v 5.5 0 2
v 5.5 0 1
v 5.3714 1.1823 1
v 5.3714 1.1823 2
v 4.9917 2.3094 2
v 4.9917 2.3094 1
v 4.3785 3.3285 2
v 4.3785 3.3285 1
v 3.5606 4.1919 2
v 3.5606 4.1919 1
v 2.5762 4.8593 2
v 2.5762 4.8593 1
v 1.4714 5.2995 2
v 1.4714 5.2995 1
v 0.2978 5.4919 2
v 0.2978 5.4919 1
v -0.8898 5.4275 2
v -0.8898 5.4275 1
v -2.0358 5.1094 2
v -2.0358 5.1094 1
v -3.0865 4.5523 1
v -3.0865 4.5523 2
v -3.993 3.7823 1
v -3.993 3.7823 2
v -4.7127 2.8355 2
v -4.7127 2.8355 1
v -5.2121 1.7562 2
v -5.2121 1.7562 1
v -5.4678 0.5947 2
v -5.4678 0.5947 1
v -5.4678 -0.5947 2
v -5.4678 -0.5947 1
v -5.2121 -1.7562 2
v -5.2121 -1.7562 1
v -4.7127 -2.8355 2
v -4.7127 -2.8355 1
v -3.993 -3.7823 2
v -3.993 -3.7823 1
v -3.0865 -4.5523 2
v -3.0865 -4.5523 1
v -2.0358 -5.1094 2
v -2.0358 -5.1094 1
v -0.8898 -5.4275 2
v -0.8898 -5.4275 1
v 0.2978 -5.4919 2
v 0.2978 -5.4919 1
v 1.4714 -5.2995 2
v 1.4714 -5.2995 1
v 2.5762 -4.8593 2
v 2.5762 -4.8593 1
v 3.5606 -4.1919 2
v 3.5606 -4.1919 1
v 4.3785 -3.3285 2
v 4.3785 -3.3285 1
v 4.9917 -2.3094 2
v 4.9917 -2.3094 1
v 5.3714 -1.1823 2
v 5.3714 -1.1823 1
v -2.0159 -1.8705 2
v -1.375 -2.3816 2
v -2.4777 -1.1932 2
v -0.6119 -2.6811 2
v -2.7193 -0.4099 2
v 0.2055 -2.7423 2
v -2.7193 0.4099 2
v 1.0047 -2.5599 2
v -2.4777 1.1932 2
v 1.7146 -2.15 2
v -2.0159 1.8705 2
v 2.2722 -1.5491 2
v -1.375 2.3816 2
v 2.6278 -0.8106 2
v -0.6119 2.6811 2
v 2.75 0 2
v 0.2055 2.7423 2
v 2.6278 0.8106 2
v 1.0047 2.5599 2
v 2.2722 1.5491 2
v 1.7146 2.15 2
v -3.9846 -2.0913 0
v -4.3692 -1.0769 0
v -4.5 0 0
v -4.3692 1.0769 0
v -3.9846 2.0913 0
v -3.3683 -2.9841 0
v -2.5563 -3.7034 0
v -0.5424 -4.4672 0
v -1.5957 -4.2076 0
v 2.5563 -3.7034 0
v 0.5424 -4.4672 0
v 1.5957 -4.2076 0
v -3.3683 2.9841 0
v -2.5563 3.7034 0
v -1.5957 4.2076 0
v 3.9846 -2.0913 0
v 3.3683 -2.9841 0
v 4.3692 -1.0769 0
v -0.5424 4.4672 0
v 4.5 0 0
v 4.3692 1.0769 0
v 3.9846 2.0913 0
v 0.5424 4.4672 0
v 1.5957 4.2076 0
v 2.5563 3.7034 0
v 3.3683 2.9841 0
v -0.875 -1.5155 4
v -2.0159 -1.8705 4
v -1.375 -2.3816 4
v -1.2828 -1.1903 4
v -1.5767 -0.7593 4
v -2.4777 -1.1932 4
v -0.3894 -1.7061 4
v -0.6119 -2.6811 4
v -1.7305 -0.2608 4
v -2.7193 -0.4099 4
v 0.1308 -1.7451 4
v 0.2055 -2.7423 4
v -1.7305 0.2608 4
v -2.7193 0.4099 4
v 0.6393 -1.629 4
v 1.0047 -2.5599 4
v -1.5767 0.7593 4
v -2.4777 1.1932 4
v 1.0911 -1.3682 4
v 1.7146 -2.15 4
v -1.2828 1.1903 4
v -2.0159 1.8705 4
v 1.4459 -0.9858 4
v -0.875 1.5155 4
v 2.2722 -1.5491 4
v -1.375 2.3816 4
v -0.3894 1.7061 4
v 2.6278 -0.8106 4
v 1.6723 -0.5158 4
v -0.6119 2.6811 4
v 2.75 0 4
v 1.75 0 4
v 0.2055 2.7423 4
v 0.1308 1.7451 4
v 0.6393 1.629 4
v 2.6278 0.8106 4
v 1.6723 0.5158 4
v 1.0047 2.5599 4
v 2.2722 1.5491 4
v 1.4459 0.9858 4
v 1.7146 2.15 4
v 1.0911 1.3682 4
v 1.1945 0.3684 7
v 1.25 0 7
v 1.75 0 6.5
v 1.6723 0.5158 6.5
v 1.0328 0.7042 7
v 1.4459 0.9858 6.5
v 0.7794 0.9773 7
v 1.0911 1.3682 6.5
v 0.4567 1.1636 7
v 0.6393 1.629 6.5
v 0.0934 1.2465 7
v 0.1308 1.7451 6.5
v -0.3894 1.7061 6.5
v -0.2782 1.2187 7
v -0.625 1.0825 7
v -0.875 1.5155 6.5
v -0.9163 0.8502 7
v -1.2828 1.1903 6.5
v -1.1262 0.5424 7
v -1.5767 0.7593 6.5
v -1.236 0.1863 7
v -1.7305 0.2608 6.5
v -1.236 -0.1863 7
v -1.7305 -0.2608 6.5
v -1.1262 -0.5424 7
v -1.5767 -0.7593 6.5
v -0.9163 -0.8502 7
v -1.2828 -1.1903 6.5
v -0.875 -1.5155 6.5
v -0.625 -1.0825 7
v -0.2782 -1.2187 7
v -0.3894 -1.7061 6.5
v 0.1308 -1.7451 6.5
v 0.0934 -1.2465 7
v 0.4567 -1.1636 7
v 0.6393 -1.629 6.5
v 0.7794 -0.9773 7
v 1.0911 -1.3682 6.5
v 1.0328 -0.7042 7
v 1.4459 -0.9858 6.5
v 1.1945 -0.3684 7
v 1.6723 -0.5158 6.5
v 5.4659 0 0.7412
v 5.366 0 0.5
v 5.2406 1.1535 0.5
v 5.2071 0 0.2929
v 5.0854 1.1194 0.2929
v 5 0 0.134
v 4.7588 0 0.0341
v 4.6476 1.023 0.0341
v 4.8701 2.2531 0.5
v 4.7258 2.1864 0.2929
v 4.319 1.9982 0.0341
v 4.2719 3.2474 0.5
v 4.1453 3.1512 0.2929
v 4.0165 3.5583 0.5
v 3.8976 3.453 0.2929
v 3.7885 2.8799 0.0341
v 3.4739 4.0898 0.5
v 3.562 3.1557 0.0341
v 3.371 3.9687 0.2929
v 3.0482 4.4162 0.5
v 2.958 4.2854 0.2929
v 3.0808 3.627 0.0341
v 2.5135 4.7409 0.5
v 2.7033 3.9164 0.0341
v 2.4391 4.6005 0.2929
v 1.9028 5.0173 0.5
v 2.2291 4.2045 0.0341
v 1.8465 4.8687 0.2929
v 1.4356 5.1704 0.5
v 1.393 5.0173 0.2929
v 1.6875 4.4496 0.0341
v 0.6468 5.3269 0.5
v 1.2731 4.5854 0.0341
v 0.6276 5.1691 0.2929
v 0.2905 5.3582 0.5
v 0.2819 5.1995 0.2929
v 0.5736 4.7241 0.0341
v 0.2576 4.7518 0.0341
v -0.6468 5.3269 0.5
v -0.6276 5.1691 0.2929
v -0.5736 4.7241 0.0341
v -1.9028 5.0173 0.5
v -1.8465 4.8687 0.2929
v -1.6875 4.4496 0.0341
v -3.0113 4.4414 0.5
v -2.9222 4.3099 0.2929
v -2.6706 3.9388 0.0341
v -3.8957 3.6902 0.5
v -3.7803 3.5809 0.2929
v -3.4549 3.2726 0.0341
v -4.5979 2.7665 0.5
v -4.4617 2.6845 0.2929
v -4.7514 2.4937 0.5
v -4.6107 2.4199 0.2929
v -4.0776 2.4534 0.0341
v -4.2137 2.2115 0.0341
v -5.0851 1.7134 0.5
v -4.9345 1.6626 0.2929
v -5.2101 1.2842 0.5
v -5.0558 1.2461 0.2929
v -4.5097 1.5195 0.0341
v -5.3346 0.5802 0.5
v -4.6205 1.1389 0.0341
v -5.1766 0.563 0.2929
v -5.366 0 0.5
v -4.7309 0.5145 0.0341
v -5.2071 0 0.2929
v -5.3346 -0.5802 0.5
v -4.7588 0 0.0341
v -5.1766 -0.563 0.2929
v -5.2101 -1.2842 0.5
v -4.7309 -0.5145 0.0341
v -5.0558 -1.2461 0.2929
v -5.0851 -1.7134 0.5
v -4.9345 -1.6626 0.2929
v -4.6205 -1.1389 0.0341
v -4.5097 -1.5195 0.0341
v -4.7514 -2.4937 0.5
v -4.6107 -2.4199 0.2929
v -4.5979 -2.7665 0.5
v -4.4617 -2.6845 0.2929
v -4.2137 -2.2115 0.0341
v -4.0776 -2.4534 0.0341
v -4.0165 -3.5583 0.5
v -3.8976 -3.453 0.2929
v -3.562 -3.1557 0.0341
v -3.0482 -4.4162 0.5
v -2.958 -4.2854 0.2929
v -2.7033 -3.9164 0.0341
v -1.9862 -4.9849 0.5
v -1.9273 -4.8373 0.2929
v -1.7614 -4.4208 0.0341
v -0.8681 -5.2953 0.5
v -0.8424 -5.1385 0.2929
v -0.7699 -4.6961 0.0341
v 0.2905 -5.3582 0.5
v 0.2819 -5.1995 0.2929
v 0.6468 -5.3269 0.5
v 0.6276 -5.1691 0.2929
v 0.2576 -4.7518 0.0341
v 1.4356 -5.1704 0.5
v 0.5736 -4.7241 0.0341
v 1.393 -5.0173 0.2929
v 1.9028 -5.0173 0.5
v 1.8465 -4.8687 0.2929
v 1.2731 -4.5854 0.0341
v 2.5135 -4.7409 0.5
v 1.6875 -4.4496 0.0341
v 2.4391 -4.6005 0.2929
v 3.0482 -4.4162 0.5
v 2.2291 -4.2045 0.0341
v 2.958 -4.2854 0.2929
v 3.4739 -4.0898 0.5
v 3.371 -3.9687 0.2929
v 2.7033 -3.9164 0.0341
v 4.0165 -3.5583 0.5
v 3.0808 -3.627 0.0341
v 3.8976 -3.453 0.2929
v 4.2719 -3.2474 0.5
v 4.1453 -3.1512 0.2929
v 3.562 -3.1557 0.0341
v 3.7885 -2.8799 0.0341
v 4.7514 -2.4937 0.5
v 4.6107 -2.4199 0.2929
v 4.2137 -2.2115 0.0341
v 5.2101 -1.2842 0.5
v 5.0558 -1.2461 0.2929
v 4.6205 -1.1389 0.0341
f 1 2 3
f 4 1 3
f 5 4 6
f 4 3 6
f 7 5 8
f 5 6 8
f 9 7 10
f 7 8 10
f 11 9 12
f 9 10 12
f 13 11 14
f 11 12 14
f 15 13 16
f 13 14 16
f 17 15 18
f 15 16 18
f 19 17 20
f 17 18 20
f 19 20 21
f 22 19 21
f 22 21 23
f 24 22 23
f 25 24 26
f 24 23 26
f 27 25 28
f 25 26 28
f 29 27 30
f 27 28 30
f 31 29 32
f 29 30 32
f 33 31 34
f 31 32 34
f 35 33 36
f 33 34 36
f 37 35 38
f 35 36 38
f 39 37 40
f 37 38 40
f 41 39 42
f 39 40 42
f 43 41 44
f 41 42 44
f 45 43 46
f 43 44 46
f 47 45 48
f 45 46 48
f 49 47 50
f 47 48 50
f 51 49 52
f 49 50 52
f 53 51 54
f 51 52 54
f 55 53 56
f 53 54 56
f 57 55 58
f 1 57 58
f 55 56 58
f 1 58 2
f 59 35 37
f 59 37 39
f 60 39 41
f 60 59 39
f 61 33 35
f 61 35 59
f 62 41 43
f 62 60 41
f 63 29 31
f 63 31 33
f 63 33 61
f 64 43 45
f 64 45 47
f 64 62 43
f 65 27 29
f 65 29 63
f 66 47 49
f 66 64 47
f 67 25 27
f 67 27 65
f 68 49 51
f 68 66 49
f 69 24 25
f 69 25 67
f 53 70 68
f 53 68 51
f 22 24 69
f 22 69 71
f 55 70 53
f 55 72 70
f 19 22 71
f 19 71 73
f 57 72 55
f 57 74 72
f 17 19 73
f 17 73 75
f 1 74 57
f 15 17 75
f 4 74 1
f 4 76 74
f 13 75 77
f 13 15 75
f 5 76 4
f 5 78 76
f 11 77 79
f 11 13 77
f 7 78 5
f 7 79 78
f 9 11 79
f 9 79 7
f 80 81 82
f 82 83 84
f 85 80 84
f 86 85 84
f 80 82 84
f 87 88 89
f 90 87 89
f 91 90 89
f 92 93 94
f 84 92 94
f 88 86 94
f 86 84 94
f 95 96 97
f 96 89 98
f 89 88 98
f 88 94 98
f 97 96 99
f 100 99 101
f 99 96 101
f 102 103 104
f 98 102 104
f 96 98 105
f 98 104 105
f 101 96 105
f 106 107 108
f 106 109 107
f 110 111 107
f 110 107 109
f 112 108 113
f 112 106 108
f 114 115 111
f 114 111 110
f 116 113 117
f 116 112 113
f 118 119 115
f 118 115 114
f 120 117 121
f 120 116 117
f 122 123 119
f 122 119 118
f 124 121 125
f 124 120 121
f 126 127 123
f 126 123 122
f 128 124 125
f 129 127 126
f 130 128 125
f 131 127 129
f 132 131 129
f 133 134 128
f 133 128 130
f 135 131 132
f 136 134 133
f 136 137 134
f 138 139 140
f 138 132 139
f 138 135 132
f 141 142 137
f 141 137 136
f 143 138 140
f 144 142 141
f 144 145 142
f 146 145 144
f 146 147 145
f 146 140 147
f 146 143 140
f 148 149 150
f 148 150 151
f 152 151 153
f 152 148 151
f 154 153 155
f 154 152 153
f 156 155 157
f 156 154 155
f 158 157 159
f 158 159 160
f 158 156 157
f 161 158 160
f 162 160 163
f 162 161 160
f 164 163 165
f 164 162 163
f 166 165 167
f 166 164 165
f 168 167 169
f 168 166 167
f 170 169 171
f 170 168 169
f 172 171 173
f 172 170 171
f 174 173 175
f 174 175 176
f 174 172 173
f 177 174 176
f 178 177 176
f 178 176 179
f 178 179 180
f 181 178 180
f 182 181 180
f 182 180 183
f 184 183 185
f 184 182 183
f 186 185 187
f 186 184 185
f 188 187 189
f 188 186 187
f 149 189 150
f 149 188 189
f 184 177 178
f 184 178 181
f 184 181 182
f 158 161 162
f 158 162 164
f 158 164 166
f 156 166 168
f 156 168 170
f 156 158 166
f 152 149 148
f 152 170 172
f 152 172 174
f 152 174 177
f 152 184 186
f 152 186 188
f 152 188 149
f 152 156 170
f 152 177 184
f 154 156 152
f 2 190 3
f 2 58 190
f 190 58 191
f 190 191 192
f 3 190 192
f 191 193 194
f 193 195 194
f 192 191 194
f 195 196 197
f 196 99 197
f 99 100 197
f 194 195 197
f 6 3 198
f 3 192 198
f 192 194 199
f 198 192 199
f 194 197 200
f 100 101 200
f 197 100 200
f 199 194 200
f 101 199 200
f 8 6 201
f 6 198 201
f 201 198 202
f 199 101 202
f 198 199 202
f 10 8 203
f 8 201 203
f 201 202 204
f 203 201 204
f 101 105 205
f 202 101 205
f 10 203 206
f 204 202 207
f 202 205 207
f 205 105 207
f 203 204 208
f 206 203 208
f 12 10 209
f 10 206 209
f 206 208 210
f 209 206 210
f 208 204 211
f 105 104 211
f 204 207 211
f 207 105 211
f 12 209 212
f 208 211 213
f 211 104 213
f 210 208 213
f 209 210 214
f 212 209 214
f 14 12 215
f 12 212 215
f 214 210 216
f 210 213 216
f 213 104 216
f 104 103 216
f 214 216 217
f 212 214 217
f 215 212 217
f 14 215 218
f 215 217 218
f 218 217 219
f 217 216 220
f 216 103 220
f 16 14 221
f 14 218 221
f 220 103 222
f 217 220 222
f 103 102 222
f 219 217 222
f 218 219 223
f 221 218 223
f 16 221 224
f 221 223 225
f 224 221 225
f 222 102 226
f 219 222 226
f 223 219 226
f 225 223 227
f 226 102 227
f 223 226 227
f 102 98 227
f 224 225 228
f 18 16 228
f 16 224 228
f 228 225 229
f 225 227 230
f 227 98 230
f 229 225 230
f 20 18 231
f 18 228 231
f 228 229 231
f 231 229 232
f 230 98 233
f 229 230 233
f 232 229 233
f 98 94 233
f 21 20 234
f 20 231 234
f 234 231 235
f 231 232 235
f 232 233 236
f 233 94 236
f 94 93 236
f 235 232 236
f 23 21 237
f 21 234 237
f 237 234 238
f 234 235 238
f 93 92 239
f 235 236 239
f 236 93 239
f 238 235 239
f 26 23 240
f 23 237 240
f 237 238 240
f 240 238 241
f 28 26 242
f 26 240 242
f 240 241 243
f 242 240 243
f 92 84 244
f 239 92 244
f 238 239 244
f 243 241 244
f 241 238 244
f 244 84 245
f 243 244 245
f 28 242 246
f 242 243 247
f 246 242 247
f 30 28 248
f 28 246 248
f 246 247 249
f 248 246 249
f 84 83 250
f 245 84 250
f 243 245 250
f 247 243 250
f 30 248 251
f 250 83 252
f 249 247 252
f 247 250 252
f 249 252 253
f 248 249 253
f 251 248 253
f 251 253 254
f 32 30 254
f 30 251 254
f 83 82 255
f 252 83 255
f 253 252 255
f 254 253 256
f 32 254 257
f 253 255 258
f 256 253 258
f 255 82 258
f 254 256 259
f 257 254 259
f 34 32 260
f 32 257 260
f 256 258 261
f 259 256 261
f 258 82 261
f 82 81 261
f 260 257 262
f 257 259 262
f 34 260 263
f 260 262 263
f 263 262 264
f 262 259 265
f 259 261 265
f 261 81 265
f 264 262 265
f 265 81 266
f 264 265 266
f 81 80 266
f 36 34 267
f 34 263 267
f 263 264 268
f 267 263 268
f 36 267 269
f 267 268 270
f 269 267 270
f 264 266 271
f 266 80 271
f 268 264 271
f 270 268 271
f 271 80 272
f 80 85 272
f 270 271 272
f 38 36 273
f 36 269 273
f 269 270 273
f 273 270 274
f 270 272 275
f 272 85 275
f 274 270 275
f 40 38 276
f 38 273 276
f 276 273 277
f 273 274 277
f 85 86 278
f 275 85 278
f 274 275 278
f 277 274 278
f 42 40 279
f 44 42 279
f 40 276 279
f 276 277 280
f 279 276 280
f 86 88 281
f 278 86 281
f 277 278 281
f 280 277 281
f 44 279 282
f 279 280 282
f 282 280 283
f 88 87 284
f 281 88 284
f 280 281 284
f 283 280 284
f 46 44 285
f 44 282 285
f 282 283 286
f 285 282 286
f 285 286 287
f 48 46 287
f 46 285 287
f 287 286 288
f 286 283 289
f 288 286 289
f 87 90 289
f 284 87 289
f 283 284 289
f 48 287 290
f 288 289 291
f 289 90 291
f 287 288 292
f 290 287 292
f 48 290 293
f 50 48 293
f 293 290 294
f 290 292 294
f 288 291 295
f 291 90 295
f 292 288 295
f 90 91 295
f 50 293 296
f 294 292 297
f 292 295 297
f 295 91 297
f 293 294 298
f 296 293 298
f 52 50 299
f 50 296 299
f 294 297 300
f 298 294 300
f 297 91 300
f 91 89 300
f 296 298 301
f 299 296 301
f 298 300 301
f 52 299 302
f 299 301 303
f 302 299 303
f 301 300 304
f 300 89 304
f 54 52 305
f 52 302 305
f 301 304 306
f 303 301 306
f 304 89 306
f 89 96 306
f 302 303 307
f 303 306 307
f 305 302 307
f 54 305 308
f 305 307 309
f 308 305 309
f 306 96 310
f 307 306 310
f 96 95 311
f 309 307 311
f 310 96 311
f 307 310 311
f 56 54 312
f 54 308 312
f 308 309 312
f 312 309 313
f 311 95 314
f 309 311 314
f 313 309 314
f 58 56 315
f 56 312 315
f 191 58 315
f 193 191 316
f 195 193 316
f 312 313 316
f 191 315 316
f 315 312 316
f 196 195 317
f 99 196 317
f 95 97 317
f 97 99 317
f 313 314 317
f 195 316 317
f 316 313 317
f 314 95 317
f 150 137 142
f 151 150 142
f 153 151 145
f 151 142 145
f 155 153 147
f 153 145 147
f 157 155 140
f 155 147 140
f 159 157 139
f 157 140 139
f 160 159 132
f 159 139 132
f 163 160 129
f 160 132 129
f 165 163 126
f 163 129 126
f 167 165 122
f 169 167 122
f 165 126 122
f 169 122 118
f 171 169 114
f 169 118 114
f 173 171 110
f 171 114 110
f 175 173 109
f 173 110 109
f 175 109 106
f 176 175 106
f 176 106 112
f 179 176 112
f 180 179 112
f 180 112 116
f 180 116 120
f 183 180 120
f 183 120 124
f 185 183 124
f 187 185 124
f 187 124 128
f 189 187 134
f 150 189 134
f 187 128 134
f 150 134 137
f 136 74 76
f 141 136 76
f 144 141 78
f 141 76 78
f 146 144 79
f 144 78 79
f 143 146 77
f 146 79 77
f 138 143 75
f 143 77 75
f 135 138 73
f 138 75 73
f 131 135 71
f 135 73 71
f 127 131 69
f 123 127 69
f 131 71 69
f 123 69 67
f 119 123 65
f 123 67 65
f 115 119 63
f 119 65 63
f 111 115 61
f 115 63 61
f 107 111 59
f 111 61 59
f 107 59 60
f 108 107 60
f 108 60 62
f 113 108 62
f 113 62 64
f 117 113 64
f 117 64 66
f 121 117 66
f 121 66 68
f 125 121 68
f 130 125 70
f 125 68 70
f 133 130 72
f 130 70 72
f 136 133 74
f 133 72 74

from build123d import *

# Parameters (mm, degrees)
F0_R     = 5.5
F1_DEPTH = 2
F2_R     = 2.75
F3_DEPTH = 2
F4_R     = 1.75
F5_DEPTH = 3
F6_R     = 1
F7_SIZE  = 0.5


with BuildPart() as f1:
    # F0 (on Top) → F1 (new body)
    with BuildSketch(Plane.XY):
        Circle(F0_R)
    extrude(amount=F1_DEPTH)

    # F2 (on face) → F3 (join)
    with BuildSketch(Plane.XY.offset(2)):
        Circle(F2_R)
    extrude(amount=F3_DEPTH)

    # F4 (on face) → F5 (join)
    with BuildSketch(Plane.XY.offset(4)):
        Circle(F4_R)
    extrude(amount=F5_DEPTH)

    # F6
    f6_edges = [f1.edges().sort_by_distance(p)[0] for p in [
        (-5.5, 0, 0),
    ]]
    fillet(f6_edges, radius=F6_R)

    # F7
    f7_edges = [f1.edges().sort_by_distance(p)[0] for p in [
        (-1.75, 0, 7),
    ]]
    chamfer(f7_edges, length=F7_SIZE)


solid = f1.part
